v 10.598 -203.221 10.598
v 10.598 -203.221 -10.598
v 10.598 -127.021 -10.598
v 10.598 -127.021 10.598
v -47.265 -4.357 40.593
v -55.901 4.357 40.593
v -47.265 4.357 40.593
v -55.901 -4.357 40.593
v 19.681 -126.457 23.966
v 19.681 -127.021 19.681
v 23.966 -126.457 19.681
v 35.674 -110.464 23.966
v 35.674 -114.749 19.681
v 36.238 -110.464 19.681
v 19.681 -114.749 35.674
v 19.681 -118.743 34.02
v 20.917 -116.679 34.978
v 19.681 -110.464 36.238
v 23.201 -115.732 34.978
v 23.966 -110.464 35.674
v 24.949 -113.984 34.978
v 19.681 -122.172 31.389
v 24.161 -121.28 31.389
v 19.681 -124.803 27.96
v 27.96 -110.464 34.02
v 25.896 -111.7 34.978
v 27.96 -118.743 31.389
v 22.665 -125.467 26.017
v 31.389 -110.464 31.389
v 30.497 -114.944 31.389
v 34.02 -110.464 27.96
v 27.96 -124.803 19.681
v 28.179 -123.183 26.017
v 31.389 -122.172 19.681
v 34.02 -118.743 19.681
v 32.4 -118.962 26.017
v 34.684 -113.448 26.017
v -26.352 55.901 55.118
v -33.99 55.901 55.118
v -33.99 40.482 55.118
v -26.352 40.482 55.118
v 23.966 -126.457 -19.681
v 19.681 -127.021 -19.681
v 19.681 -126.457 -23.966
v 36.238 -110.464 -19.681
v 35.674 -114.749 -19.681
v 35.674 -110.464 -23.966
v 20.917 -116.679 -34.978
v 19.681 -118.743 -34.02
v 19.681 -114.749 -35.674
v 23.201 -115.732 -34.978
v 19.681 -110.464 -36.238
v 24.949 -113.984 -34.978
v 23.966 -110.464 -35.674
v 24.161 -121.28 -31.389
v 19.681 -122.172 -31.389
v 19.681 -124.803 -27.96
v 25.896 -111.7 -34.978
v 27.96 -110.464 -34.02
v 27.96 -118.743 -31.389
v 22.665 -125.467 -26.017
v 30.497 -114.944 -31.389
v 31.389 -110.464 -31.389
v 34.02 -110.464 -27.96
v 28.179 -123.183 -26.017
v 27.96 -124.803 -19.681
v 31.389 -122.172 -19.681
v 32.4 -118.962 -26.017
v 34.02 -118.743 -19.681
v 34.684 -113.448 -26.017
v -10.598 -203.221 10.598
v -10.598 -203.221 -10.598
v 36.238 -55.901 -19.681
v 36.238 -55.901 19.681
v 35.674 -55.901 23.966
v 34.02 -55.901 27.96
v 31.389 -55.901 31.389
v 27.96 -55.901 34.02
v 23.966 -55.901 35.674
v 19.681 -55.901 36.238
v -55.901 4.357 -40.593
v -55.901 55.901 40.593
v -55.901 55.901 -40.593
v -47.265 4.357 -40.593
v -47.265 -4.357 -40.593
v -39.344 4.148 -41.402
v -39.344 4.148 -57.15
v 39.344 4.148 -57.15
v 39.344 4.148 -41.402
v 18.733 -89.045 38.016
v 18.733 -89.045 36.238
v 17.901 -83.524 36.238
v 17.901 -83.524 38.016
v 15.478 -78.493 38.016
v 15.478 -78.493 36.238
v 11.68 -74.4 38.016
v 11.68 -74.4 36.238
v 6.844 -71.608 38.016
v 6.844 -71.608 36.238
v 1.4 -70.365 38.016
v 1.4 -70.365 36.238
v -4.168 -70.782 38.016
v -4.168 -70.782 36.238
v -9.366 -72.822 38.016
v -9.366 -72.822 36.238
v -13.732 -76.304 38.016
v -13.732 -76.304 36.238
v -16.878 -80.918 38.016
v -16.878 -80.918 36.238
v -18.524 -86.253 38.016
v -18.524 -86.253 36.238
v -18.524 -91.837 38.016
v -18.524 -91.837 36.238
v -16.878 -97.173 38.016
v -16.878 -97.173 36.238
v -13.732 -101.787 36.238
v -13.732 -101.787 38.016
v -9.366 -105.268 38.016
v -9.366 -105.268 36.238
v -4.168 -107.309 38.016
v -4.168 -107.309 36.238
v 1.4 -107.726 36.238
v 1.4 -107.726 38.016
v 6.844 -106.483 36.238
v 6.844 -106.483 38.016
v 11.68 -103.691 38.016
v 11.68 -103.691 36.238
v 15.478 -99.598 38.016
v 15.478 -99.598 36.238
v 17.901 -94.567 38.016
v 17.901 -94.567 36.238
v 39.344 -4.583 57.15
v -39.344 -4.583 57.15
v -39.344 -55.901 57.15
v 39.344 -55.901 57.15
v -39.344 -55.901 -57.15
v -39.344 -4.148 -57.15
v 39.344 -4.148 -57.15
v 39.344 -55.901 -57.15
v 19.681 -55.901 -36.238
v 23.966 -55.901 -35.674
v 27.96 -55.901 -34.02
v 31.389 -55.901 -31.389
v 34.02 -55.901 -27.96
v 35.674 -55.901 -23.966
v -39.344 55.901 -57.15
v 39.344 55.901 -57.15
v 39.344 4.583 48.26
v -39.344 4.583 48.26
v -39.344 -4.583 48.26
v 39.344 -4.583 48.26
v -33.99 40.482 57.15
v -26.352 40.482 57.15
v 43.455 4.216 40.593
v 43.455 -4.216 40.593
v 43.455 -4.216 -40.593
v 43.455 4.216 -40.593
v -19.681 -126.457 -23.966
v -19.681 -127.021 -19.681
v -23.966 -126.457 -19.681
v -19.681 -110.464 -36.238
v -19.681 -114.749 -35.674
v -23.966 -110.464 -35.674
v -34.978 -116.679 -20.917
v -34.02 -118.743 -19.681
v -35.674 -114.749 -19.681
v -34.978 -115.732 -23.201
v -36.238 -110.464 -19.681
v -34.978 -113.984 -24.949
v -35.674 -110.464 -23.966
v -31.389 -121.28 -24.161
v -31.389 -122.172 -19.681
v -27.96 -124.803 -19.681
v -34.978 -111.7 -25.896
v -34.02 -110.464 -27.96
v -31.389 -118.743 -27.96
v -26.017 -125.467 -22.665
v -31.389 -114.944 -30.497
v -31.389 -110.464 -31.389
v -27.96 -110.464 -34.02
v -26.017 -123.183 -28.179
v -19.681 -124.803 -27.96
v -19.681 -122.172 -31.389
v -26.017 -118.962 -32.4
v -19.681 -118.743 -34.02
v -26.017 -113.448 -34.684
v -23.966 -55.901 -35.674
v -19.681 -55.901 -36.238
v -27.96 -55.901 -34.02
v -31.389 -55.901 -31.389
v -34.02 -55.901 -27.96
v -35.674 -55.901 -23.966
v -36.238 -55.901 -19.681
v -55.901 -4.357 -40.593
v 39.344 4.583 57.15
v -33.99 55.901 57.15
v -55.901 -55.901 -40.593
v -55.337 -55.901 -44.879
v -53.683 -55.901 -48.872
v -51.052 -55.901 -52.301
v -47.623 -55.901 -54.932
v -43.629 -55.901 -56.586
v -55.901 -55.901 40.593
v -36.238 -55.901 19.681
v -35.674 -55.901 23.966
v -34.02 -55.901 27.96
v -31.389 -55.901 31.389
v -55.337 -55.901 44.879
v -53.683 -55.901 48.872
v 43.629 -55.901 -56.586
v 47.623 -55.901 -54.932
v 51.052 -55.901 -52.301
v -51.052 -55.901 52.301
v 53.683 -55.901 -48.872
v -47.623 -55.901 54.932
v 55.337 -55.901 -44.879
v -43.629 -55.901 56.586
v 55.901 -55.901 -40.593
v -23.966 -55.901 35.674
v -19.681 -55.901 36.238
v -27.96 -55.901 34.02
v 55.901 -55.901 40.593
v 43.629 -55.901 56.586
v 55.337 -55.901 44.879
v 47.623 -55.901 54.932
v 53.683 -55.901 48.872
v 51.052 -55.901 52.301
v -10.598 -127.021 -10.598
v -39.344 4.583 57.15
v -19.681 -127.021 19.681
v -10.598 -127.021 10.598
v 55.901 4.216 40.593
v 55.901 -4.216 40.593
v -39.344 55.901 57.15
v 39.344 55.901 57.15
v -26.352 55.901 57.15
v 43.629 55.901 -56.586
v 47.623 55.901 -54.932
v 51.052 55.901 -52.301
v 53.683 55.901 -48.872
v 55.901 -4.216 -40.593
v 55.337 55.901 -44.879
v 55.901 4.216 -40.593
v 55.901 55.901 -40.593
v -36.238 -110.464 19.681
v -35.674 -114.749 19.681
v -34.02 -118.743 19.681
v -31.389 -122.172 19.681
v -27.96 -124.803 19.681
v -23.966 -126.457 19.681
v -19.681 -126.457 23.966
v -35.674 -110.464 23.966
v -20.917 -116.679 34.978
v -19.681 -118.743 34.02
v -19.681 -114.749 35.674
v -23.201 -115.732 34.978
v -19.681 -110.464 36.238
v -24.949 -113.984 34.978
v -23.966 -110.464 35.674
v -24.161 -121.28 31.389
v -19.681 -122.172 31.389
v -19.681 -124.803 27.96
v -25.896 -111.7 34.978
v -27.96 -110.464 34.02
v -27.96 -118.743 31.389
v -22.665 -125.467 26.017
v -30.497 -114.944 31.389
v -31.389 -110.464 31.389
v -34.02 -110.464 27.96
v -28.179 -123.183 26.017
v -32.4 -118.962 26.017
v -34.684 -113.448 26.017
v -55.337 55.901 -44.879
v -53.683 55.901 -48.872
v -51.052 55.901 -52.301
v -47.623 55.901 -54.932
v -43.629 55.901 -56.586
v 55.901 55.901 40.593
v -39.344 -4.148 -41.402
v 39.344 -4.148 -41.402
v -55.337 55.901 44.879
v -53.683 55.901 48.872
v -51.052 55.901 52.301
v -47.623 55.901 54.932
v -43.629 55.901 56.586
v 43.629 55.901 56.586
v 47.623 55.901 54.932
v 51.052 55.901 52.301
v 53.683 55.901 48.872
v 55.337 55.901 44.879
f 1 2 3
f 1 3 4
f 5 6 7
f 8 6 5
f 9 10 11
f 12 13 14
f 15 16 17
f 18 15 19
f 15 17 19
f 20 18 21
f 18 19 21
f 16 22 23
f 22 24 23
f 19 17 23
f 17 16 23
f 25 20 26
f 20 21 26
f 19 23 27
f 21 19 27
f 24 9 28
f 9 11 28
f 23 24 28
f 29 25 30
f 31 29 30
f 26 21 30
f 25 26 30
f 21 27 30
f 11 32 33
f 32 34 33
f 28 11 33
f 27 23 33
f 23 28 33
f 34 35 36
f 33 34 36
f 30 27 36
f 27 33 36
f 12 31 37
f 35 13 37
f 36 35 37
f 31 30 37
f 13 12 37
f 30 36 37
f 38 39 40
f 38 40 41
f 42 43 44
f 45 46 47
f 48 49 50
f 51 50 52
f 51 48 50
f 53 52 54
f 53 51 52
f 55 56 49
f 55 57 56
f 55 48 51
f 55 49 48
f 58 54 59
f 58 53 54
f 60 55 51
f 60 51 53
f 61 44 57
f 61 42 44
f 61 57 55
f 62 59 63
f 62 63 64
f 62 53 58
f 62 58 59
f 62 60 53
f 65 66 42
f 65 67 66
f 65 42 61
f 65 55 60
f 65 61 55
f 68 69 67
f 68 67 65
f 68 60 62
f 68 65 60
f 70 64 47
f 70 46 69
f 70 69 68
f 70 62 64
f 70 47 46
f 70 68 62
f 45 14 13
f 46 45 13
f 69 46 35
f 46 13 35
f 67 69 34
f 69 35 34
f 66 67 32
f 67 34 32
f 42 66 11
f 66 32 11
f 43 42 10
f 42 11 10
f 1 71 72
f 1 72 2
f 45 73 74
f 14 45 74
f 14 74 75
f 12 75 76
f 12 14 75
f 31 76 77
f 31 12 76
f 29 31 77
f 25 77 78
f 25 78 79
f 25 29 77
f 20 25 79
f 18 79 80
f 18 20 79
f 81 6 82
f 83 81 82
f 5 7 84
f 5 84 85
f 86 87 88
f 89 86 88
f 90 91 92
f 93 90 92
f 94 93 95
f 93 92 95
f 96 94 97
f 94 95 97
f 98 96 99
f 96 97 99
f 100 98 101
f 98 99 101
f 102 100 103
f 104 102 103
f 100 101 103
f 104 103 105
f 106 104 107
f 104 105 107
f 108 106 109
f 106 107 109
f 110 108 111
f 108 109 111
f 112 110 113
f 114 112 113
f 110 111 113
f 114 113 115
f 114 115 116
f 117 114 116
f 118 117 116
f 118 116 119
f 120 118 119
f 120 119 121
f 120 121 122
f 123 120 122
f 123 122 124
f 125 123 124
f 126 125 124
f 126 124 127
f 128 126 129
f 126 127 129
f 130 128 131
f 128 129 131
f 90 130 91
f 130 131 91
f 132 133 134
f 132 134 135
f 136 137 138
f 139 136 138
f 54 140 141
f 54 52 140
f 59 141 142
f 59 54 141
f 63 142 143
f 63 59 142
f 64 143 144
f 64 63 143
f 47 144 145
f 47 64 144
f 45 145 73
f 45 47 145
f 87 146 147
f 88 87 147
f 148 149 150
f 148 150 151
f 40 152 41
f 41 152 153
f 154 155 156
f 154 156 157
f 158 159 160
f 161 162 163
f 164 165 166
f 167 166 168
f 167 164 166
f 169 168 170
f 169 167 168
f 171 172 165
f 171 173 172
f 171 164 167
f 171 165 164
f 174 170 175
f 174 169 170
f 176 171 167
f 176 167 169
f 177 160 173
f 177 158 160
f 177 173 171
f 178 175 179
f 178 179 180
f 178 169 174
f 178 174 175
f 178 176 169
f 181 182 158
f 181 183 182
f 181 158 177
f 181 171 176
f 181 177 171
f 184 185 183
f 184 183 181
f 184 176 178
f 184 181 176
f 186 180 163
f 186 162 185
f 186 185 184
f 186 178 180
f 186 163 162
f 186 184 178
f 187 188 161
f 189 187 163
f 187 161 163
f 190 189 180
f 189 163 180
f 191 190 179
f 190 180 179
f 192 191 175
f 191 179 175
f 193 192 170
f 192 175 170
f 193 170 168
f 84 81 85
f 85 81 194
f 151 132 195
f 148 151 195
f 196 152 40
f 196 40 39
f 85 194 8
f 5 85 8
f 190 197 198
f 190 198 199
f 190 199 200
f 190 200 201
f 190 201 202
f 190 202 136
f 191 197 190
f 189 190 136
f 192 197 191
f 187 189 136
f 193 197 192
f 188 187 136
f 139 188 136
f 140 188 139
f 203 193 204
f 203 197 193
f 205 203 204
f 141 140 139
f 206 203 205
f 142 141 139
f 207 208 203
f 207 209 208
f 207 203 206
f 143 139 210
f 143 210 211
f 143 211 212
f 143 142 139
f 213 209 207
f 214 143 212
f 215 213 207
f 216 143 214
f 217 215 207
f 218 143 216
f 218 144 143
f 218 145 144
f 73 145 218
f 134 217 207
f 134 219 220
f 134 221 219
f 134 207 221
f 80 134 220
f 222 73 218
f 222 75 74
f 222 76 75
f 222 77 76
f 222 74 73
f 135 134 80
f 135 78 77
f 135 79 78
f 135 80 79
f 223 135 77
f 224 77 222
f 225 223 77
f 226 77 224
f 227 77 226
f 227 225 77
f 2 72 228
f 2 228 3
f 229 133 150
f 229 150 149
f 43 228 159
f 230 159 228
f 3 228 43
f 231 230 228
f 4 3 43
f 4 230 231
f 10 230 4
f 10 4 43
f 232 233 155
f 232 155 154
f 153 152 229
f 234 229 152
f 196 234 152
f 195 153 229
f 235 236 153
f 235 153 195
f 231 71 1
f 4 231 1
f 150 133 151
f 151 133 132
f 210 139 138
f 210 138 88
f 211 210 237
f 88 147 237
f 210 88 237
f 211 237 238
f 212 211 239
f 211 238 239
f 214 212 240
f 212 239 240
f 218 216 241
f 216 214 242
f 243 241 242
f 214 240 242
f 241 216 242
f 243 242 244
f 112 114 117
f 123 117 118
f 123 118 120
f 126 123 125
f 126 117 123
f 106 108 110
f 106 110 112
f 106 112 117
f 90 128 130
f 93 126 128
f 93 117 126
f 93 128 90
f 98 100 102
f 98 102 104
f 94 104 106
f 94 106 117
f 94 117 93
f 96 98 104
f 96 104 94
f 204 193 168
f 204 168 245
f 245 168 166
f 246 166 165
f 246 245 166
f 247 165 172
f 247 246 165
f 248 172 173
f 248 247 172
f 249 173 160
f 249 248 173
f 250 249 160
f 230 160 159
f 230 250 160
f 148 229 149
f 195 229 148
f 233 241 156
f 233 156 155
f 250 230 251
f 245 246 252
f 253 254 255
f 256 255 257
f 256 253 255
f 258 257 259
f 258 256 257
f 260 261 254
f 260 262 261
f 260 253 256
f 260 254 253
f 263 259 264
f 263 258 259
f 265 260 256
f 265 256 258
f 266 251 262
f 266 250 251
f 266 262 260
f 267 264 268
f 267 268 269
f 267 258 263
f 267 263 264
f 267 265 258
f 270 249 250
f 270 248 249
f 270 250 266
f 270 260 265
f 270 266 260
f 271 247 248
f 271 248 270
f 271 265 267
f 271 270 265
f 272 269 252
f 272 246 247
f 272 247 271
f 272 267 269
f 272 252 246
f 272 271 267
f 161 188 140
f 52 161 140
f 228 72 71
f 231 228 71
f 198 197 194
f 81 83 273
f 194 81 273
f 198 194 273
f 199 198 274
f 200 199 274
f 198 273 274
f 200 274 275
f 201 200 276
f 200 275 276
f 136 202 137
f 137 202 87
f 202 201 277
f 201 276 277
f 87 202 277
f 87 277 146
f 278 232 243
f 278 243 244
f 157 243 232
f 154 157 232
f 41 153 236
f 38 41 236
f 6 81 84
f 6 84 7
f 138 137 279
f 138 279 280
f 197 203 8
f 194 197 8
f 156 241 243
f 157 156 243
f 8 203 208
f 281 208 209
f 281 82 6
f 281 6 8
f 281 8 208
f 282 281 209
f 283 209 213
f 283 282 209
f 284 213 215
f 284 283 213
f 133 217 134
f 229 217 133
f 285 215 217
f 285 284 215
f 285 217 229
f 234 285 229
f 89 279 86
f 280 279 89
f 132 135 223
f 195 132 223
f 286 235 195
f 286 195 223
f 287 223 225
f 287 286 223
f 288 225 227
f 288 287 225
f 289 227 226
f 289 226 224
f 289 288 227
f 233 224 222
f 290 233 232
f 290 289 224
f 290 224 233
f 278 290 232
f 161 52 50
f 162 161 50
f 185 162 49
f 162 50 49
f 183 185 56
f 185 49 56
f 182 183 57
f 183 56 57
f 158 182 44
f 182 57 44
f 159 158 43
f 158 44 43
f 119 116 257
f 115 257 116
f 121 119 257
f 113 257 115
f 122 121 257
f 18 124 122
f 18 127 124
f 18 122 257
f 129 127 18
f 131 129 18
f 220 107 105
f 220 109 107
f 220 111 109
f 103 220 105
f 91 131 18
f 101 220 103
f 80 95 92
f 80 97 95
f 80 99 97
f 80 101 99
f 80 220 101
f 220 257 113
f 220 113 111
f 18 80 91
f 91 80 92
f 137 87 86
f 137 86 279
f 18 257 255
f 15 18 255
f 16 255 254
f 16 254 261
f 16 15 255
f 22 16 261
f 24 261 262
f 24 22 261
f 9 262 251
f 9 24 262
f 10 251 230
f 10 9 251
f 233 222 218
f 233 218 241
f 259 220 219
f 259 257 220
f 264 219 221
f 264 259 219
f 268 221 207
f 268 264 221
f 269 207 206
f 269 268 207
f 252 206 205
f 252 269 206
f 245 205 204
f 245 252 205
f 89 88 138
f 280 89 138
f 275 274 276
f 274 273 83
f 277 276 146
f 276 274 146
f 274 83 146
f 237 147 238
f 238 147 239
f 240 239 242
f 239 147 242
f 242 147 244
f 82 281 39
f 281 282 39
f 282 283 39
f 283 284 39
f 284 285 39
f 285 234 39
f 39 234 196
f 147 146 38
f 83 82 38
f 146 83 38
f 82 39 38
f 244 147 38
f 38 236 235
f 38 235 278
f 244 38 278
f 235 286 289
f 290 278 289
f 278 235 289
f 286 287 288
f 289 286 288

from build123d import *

# Parameters (mm, degrees)
F0_W      = 111.801914
F0_H      = 111.801914
F1_DEPTH  = 57.15
F2_W      = 72.47591
F2_H      = 72.47591
F3_DEPTH  = 71.12
F4_W      = 21.19565
F4_H      = 21.19565
F5_DEPTH  = 76.2
F6_R      = 16.556677
F7_W      = 7.638184
F7_H      = 15.41857
F8_DEPTH  = 25.4
F8_FACE_W = 7.638184
F8_FACE_H = 15.41857
F9_DEPTH  = 27.432
F10_W     = 78.688562
F10_H     = 9.165822
F11_DEPTH = 8.89
F12_W     = 8.714252
F12_H     = 81.186646
F13_DEPTH = 8.636
F14_W     = 78.688562
F14_H     = 8.29689
F15_DEPTH = 15.748
F16_W     = 8.432022
F16_H     = 81.186646
F17_DEPTH = 12.446
F18_R     = 18.732784
F19_DEPTH = 1.778


with BuildPart() as f1:
    # F0 (on Top) → F1 (new body, symmetric)
    with BuildSketch(Plane.XY):
        Rectangle(F0_W, F0_H)
    extrude(amount=F1_DEPTH, both=True)

    # F2 (on face) → F3 (join)
    with BuildSketch(Plane.XZ.offset(55.900957)):
        Rectangle(F2_W, F2_H)
    extrude(amount=F3_DEPTH)

    # F4 (on face) → F5 (join)
    with BuildSketch(Plane.XZ.offset(127.020957)):
        Rectangle(F4_W, F4_H)
    extrude(amount=F5_DEPTH)

    # F6
    f6_edges = [f1.edges().sort_by_distance(p)[0] for p in [
        (-55.900957, 0, 57.15),
        (-55.900957, 0, -57.15),
        (55.900957, 0, -57.15),
        (55.900957, 0, 57.15),
        (36.237955, -127.020957, 0),
        (0, -127.020957, -36.237955),
        (-36.237955, -127.020957, 0),
        (0, -127.020957, 36.237955),
        (-36.237955, -91.460957, -36.237955),
        (36.237955, -91.460957, -36.237955),
        (36.237955, -91.460957, 36.237955),
        (-36.237955, -91.460957, 36.237955),
    ]]
    fillet(f6_edges, radius=F6_R)

    # F7 (on face) → F8 (join)
    with BuildSketch(Plane.XY.offset(57.15)):
        with Locations((-30.17084, 48.191672)):
            Rectangle(F7_W, F7_H)
    extrude(amount=F8_DEPTH)

    # F8_face (on face) → F9 (cut)
    with BuildSketch(Plane(origin=(-30.17084, 48.191672, 82.55), x_dir=(1, 0, 0), z_dir=(0, 0, 1))):
        Rectangle(F8_FACE_W, F8_FACE_H)
    extrude(amount=-F9_DEPTH, mode=Mode.SUBTRACT)

    # F10 (on face) → F11 (cut)
    with BuildSketch(Plane.XY.offset(57.15)):
        Rectangle(F10_W, F10_H)
    extrude(amount=-F11_DEPTH, mode=Mode.SUBTRACT)

    # F12 (on face) → F13 (cut)
    with BuildSketch(Plane(origin=(-55.900957, 0, 0), x_dir=(0, -1, 0), z_dir=(-1, 0, 0))):
        Rectangle(F12_W, F12_H)
    extrude(amount=-F13_DEPTH, mode=Mode.SUBTRACT)

    # F14 (on face) → F15 (cut)
    with BuildSketch(Plane(origin=(0, 0, -57.15), x_dir=(1, 0, 0), z_dir=(0, 0, -1))):
        Rectangle(F14_W, F14_H)
    extrude(amount=-F15_DEPTH, mode=Mode.SUBTRACT)

    # F16 (on face) → F17 (cut)
    with BuildSketch(Plane.YZ.offset(55.900957)):
        Rectangle(F16_W, F16_H)
    extrude(amount=-F17_DEPTH, mode=Mode.SUBTRACT)

    # F18 (on face) → F19 (join)
    with BuildSketch(Plane.XY.offset(36.237955)):
        with Locations((0, -89.04539)):
            Circle(F18_R)
    extrude(amount=F19_DEPTH)


solid = f1.part
